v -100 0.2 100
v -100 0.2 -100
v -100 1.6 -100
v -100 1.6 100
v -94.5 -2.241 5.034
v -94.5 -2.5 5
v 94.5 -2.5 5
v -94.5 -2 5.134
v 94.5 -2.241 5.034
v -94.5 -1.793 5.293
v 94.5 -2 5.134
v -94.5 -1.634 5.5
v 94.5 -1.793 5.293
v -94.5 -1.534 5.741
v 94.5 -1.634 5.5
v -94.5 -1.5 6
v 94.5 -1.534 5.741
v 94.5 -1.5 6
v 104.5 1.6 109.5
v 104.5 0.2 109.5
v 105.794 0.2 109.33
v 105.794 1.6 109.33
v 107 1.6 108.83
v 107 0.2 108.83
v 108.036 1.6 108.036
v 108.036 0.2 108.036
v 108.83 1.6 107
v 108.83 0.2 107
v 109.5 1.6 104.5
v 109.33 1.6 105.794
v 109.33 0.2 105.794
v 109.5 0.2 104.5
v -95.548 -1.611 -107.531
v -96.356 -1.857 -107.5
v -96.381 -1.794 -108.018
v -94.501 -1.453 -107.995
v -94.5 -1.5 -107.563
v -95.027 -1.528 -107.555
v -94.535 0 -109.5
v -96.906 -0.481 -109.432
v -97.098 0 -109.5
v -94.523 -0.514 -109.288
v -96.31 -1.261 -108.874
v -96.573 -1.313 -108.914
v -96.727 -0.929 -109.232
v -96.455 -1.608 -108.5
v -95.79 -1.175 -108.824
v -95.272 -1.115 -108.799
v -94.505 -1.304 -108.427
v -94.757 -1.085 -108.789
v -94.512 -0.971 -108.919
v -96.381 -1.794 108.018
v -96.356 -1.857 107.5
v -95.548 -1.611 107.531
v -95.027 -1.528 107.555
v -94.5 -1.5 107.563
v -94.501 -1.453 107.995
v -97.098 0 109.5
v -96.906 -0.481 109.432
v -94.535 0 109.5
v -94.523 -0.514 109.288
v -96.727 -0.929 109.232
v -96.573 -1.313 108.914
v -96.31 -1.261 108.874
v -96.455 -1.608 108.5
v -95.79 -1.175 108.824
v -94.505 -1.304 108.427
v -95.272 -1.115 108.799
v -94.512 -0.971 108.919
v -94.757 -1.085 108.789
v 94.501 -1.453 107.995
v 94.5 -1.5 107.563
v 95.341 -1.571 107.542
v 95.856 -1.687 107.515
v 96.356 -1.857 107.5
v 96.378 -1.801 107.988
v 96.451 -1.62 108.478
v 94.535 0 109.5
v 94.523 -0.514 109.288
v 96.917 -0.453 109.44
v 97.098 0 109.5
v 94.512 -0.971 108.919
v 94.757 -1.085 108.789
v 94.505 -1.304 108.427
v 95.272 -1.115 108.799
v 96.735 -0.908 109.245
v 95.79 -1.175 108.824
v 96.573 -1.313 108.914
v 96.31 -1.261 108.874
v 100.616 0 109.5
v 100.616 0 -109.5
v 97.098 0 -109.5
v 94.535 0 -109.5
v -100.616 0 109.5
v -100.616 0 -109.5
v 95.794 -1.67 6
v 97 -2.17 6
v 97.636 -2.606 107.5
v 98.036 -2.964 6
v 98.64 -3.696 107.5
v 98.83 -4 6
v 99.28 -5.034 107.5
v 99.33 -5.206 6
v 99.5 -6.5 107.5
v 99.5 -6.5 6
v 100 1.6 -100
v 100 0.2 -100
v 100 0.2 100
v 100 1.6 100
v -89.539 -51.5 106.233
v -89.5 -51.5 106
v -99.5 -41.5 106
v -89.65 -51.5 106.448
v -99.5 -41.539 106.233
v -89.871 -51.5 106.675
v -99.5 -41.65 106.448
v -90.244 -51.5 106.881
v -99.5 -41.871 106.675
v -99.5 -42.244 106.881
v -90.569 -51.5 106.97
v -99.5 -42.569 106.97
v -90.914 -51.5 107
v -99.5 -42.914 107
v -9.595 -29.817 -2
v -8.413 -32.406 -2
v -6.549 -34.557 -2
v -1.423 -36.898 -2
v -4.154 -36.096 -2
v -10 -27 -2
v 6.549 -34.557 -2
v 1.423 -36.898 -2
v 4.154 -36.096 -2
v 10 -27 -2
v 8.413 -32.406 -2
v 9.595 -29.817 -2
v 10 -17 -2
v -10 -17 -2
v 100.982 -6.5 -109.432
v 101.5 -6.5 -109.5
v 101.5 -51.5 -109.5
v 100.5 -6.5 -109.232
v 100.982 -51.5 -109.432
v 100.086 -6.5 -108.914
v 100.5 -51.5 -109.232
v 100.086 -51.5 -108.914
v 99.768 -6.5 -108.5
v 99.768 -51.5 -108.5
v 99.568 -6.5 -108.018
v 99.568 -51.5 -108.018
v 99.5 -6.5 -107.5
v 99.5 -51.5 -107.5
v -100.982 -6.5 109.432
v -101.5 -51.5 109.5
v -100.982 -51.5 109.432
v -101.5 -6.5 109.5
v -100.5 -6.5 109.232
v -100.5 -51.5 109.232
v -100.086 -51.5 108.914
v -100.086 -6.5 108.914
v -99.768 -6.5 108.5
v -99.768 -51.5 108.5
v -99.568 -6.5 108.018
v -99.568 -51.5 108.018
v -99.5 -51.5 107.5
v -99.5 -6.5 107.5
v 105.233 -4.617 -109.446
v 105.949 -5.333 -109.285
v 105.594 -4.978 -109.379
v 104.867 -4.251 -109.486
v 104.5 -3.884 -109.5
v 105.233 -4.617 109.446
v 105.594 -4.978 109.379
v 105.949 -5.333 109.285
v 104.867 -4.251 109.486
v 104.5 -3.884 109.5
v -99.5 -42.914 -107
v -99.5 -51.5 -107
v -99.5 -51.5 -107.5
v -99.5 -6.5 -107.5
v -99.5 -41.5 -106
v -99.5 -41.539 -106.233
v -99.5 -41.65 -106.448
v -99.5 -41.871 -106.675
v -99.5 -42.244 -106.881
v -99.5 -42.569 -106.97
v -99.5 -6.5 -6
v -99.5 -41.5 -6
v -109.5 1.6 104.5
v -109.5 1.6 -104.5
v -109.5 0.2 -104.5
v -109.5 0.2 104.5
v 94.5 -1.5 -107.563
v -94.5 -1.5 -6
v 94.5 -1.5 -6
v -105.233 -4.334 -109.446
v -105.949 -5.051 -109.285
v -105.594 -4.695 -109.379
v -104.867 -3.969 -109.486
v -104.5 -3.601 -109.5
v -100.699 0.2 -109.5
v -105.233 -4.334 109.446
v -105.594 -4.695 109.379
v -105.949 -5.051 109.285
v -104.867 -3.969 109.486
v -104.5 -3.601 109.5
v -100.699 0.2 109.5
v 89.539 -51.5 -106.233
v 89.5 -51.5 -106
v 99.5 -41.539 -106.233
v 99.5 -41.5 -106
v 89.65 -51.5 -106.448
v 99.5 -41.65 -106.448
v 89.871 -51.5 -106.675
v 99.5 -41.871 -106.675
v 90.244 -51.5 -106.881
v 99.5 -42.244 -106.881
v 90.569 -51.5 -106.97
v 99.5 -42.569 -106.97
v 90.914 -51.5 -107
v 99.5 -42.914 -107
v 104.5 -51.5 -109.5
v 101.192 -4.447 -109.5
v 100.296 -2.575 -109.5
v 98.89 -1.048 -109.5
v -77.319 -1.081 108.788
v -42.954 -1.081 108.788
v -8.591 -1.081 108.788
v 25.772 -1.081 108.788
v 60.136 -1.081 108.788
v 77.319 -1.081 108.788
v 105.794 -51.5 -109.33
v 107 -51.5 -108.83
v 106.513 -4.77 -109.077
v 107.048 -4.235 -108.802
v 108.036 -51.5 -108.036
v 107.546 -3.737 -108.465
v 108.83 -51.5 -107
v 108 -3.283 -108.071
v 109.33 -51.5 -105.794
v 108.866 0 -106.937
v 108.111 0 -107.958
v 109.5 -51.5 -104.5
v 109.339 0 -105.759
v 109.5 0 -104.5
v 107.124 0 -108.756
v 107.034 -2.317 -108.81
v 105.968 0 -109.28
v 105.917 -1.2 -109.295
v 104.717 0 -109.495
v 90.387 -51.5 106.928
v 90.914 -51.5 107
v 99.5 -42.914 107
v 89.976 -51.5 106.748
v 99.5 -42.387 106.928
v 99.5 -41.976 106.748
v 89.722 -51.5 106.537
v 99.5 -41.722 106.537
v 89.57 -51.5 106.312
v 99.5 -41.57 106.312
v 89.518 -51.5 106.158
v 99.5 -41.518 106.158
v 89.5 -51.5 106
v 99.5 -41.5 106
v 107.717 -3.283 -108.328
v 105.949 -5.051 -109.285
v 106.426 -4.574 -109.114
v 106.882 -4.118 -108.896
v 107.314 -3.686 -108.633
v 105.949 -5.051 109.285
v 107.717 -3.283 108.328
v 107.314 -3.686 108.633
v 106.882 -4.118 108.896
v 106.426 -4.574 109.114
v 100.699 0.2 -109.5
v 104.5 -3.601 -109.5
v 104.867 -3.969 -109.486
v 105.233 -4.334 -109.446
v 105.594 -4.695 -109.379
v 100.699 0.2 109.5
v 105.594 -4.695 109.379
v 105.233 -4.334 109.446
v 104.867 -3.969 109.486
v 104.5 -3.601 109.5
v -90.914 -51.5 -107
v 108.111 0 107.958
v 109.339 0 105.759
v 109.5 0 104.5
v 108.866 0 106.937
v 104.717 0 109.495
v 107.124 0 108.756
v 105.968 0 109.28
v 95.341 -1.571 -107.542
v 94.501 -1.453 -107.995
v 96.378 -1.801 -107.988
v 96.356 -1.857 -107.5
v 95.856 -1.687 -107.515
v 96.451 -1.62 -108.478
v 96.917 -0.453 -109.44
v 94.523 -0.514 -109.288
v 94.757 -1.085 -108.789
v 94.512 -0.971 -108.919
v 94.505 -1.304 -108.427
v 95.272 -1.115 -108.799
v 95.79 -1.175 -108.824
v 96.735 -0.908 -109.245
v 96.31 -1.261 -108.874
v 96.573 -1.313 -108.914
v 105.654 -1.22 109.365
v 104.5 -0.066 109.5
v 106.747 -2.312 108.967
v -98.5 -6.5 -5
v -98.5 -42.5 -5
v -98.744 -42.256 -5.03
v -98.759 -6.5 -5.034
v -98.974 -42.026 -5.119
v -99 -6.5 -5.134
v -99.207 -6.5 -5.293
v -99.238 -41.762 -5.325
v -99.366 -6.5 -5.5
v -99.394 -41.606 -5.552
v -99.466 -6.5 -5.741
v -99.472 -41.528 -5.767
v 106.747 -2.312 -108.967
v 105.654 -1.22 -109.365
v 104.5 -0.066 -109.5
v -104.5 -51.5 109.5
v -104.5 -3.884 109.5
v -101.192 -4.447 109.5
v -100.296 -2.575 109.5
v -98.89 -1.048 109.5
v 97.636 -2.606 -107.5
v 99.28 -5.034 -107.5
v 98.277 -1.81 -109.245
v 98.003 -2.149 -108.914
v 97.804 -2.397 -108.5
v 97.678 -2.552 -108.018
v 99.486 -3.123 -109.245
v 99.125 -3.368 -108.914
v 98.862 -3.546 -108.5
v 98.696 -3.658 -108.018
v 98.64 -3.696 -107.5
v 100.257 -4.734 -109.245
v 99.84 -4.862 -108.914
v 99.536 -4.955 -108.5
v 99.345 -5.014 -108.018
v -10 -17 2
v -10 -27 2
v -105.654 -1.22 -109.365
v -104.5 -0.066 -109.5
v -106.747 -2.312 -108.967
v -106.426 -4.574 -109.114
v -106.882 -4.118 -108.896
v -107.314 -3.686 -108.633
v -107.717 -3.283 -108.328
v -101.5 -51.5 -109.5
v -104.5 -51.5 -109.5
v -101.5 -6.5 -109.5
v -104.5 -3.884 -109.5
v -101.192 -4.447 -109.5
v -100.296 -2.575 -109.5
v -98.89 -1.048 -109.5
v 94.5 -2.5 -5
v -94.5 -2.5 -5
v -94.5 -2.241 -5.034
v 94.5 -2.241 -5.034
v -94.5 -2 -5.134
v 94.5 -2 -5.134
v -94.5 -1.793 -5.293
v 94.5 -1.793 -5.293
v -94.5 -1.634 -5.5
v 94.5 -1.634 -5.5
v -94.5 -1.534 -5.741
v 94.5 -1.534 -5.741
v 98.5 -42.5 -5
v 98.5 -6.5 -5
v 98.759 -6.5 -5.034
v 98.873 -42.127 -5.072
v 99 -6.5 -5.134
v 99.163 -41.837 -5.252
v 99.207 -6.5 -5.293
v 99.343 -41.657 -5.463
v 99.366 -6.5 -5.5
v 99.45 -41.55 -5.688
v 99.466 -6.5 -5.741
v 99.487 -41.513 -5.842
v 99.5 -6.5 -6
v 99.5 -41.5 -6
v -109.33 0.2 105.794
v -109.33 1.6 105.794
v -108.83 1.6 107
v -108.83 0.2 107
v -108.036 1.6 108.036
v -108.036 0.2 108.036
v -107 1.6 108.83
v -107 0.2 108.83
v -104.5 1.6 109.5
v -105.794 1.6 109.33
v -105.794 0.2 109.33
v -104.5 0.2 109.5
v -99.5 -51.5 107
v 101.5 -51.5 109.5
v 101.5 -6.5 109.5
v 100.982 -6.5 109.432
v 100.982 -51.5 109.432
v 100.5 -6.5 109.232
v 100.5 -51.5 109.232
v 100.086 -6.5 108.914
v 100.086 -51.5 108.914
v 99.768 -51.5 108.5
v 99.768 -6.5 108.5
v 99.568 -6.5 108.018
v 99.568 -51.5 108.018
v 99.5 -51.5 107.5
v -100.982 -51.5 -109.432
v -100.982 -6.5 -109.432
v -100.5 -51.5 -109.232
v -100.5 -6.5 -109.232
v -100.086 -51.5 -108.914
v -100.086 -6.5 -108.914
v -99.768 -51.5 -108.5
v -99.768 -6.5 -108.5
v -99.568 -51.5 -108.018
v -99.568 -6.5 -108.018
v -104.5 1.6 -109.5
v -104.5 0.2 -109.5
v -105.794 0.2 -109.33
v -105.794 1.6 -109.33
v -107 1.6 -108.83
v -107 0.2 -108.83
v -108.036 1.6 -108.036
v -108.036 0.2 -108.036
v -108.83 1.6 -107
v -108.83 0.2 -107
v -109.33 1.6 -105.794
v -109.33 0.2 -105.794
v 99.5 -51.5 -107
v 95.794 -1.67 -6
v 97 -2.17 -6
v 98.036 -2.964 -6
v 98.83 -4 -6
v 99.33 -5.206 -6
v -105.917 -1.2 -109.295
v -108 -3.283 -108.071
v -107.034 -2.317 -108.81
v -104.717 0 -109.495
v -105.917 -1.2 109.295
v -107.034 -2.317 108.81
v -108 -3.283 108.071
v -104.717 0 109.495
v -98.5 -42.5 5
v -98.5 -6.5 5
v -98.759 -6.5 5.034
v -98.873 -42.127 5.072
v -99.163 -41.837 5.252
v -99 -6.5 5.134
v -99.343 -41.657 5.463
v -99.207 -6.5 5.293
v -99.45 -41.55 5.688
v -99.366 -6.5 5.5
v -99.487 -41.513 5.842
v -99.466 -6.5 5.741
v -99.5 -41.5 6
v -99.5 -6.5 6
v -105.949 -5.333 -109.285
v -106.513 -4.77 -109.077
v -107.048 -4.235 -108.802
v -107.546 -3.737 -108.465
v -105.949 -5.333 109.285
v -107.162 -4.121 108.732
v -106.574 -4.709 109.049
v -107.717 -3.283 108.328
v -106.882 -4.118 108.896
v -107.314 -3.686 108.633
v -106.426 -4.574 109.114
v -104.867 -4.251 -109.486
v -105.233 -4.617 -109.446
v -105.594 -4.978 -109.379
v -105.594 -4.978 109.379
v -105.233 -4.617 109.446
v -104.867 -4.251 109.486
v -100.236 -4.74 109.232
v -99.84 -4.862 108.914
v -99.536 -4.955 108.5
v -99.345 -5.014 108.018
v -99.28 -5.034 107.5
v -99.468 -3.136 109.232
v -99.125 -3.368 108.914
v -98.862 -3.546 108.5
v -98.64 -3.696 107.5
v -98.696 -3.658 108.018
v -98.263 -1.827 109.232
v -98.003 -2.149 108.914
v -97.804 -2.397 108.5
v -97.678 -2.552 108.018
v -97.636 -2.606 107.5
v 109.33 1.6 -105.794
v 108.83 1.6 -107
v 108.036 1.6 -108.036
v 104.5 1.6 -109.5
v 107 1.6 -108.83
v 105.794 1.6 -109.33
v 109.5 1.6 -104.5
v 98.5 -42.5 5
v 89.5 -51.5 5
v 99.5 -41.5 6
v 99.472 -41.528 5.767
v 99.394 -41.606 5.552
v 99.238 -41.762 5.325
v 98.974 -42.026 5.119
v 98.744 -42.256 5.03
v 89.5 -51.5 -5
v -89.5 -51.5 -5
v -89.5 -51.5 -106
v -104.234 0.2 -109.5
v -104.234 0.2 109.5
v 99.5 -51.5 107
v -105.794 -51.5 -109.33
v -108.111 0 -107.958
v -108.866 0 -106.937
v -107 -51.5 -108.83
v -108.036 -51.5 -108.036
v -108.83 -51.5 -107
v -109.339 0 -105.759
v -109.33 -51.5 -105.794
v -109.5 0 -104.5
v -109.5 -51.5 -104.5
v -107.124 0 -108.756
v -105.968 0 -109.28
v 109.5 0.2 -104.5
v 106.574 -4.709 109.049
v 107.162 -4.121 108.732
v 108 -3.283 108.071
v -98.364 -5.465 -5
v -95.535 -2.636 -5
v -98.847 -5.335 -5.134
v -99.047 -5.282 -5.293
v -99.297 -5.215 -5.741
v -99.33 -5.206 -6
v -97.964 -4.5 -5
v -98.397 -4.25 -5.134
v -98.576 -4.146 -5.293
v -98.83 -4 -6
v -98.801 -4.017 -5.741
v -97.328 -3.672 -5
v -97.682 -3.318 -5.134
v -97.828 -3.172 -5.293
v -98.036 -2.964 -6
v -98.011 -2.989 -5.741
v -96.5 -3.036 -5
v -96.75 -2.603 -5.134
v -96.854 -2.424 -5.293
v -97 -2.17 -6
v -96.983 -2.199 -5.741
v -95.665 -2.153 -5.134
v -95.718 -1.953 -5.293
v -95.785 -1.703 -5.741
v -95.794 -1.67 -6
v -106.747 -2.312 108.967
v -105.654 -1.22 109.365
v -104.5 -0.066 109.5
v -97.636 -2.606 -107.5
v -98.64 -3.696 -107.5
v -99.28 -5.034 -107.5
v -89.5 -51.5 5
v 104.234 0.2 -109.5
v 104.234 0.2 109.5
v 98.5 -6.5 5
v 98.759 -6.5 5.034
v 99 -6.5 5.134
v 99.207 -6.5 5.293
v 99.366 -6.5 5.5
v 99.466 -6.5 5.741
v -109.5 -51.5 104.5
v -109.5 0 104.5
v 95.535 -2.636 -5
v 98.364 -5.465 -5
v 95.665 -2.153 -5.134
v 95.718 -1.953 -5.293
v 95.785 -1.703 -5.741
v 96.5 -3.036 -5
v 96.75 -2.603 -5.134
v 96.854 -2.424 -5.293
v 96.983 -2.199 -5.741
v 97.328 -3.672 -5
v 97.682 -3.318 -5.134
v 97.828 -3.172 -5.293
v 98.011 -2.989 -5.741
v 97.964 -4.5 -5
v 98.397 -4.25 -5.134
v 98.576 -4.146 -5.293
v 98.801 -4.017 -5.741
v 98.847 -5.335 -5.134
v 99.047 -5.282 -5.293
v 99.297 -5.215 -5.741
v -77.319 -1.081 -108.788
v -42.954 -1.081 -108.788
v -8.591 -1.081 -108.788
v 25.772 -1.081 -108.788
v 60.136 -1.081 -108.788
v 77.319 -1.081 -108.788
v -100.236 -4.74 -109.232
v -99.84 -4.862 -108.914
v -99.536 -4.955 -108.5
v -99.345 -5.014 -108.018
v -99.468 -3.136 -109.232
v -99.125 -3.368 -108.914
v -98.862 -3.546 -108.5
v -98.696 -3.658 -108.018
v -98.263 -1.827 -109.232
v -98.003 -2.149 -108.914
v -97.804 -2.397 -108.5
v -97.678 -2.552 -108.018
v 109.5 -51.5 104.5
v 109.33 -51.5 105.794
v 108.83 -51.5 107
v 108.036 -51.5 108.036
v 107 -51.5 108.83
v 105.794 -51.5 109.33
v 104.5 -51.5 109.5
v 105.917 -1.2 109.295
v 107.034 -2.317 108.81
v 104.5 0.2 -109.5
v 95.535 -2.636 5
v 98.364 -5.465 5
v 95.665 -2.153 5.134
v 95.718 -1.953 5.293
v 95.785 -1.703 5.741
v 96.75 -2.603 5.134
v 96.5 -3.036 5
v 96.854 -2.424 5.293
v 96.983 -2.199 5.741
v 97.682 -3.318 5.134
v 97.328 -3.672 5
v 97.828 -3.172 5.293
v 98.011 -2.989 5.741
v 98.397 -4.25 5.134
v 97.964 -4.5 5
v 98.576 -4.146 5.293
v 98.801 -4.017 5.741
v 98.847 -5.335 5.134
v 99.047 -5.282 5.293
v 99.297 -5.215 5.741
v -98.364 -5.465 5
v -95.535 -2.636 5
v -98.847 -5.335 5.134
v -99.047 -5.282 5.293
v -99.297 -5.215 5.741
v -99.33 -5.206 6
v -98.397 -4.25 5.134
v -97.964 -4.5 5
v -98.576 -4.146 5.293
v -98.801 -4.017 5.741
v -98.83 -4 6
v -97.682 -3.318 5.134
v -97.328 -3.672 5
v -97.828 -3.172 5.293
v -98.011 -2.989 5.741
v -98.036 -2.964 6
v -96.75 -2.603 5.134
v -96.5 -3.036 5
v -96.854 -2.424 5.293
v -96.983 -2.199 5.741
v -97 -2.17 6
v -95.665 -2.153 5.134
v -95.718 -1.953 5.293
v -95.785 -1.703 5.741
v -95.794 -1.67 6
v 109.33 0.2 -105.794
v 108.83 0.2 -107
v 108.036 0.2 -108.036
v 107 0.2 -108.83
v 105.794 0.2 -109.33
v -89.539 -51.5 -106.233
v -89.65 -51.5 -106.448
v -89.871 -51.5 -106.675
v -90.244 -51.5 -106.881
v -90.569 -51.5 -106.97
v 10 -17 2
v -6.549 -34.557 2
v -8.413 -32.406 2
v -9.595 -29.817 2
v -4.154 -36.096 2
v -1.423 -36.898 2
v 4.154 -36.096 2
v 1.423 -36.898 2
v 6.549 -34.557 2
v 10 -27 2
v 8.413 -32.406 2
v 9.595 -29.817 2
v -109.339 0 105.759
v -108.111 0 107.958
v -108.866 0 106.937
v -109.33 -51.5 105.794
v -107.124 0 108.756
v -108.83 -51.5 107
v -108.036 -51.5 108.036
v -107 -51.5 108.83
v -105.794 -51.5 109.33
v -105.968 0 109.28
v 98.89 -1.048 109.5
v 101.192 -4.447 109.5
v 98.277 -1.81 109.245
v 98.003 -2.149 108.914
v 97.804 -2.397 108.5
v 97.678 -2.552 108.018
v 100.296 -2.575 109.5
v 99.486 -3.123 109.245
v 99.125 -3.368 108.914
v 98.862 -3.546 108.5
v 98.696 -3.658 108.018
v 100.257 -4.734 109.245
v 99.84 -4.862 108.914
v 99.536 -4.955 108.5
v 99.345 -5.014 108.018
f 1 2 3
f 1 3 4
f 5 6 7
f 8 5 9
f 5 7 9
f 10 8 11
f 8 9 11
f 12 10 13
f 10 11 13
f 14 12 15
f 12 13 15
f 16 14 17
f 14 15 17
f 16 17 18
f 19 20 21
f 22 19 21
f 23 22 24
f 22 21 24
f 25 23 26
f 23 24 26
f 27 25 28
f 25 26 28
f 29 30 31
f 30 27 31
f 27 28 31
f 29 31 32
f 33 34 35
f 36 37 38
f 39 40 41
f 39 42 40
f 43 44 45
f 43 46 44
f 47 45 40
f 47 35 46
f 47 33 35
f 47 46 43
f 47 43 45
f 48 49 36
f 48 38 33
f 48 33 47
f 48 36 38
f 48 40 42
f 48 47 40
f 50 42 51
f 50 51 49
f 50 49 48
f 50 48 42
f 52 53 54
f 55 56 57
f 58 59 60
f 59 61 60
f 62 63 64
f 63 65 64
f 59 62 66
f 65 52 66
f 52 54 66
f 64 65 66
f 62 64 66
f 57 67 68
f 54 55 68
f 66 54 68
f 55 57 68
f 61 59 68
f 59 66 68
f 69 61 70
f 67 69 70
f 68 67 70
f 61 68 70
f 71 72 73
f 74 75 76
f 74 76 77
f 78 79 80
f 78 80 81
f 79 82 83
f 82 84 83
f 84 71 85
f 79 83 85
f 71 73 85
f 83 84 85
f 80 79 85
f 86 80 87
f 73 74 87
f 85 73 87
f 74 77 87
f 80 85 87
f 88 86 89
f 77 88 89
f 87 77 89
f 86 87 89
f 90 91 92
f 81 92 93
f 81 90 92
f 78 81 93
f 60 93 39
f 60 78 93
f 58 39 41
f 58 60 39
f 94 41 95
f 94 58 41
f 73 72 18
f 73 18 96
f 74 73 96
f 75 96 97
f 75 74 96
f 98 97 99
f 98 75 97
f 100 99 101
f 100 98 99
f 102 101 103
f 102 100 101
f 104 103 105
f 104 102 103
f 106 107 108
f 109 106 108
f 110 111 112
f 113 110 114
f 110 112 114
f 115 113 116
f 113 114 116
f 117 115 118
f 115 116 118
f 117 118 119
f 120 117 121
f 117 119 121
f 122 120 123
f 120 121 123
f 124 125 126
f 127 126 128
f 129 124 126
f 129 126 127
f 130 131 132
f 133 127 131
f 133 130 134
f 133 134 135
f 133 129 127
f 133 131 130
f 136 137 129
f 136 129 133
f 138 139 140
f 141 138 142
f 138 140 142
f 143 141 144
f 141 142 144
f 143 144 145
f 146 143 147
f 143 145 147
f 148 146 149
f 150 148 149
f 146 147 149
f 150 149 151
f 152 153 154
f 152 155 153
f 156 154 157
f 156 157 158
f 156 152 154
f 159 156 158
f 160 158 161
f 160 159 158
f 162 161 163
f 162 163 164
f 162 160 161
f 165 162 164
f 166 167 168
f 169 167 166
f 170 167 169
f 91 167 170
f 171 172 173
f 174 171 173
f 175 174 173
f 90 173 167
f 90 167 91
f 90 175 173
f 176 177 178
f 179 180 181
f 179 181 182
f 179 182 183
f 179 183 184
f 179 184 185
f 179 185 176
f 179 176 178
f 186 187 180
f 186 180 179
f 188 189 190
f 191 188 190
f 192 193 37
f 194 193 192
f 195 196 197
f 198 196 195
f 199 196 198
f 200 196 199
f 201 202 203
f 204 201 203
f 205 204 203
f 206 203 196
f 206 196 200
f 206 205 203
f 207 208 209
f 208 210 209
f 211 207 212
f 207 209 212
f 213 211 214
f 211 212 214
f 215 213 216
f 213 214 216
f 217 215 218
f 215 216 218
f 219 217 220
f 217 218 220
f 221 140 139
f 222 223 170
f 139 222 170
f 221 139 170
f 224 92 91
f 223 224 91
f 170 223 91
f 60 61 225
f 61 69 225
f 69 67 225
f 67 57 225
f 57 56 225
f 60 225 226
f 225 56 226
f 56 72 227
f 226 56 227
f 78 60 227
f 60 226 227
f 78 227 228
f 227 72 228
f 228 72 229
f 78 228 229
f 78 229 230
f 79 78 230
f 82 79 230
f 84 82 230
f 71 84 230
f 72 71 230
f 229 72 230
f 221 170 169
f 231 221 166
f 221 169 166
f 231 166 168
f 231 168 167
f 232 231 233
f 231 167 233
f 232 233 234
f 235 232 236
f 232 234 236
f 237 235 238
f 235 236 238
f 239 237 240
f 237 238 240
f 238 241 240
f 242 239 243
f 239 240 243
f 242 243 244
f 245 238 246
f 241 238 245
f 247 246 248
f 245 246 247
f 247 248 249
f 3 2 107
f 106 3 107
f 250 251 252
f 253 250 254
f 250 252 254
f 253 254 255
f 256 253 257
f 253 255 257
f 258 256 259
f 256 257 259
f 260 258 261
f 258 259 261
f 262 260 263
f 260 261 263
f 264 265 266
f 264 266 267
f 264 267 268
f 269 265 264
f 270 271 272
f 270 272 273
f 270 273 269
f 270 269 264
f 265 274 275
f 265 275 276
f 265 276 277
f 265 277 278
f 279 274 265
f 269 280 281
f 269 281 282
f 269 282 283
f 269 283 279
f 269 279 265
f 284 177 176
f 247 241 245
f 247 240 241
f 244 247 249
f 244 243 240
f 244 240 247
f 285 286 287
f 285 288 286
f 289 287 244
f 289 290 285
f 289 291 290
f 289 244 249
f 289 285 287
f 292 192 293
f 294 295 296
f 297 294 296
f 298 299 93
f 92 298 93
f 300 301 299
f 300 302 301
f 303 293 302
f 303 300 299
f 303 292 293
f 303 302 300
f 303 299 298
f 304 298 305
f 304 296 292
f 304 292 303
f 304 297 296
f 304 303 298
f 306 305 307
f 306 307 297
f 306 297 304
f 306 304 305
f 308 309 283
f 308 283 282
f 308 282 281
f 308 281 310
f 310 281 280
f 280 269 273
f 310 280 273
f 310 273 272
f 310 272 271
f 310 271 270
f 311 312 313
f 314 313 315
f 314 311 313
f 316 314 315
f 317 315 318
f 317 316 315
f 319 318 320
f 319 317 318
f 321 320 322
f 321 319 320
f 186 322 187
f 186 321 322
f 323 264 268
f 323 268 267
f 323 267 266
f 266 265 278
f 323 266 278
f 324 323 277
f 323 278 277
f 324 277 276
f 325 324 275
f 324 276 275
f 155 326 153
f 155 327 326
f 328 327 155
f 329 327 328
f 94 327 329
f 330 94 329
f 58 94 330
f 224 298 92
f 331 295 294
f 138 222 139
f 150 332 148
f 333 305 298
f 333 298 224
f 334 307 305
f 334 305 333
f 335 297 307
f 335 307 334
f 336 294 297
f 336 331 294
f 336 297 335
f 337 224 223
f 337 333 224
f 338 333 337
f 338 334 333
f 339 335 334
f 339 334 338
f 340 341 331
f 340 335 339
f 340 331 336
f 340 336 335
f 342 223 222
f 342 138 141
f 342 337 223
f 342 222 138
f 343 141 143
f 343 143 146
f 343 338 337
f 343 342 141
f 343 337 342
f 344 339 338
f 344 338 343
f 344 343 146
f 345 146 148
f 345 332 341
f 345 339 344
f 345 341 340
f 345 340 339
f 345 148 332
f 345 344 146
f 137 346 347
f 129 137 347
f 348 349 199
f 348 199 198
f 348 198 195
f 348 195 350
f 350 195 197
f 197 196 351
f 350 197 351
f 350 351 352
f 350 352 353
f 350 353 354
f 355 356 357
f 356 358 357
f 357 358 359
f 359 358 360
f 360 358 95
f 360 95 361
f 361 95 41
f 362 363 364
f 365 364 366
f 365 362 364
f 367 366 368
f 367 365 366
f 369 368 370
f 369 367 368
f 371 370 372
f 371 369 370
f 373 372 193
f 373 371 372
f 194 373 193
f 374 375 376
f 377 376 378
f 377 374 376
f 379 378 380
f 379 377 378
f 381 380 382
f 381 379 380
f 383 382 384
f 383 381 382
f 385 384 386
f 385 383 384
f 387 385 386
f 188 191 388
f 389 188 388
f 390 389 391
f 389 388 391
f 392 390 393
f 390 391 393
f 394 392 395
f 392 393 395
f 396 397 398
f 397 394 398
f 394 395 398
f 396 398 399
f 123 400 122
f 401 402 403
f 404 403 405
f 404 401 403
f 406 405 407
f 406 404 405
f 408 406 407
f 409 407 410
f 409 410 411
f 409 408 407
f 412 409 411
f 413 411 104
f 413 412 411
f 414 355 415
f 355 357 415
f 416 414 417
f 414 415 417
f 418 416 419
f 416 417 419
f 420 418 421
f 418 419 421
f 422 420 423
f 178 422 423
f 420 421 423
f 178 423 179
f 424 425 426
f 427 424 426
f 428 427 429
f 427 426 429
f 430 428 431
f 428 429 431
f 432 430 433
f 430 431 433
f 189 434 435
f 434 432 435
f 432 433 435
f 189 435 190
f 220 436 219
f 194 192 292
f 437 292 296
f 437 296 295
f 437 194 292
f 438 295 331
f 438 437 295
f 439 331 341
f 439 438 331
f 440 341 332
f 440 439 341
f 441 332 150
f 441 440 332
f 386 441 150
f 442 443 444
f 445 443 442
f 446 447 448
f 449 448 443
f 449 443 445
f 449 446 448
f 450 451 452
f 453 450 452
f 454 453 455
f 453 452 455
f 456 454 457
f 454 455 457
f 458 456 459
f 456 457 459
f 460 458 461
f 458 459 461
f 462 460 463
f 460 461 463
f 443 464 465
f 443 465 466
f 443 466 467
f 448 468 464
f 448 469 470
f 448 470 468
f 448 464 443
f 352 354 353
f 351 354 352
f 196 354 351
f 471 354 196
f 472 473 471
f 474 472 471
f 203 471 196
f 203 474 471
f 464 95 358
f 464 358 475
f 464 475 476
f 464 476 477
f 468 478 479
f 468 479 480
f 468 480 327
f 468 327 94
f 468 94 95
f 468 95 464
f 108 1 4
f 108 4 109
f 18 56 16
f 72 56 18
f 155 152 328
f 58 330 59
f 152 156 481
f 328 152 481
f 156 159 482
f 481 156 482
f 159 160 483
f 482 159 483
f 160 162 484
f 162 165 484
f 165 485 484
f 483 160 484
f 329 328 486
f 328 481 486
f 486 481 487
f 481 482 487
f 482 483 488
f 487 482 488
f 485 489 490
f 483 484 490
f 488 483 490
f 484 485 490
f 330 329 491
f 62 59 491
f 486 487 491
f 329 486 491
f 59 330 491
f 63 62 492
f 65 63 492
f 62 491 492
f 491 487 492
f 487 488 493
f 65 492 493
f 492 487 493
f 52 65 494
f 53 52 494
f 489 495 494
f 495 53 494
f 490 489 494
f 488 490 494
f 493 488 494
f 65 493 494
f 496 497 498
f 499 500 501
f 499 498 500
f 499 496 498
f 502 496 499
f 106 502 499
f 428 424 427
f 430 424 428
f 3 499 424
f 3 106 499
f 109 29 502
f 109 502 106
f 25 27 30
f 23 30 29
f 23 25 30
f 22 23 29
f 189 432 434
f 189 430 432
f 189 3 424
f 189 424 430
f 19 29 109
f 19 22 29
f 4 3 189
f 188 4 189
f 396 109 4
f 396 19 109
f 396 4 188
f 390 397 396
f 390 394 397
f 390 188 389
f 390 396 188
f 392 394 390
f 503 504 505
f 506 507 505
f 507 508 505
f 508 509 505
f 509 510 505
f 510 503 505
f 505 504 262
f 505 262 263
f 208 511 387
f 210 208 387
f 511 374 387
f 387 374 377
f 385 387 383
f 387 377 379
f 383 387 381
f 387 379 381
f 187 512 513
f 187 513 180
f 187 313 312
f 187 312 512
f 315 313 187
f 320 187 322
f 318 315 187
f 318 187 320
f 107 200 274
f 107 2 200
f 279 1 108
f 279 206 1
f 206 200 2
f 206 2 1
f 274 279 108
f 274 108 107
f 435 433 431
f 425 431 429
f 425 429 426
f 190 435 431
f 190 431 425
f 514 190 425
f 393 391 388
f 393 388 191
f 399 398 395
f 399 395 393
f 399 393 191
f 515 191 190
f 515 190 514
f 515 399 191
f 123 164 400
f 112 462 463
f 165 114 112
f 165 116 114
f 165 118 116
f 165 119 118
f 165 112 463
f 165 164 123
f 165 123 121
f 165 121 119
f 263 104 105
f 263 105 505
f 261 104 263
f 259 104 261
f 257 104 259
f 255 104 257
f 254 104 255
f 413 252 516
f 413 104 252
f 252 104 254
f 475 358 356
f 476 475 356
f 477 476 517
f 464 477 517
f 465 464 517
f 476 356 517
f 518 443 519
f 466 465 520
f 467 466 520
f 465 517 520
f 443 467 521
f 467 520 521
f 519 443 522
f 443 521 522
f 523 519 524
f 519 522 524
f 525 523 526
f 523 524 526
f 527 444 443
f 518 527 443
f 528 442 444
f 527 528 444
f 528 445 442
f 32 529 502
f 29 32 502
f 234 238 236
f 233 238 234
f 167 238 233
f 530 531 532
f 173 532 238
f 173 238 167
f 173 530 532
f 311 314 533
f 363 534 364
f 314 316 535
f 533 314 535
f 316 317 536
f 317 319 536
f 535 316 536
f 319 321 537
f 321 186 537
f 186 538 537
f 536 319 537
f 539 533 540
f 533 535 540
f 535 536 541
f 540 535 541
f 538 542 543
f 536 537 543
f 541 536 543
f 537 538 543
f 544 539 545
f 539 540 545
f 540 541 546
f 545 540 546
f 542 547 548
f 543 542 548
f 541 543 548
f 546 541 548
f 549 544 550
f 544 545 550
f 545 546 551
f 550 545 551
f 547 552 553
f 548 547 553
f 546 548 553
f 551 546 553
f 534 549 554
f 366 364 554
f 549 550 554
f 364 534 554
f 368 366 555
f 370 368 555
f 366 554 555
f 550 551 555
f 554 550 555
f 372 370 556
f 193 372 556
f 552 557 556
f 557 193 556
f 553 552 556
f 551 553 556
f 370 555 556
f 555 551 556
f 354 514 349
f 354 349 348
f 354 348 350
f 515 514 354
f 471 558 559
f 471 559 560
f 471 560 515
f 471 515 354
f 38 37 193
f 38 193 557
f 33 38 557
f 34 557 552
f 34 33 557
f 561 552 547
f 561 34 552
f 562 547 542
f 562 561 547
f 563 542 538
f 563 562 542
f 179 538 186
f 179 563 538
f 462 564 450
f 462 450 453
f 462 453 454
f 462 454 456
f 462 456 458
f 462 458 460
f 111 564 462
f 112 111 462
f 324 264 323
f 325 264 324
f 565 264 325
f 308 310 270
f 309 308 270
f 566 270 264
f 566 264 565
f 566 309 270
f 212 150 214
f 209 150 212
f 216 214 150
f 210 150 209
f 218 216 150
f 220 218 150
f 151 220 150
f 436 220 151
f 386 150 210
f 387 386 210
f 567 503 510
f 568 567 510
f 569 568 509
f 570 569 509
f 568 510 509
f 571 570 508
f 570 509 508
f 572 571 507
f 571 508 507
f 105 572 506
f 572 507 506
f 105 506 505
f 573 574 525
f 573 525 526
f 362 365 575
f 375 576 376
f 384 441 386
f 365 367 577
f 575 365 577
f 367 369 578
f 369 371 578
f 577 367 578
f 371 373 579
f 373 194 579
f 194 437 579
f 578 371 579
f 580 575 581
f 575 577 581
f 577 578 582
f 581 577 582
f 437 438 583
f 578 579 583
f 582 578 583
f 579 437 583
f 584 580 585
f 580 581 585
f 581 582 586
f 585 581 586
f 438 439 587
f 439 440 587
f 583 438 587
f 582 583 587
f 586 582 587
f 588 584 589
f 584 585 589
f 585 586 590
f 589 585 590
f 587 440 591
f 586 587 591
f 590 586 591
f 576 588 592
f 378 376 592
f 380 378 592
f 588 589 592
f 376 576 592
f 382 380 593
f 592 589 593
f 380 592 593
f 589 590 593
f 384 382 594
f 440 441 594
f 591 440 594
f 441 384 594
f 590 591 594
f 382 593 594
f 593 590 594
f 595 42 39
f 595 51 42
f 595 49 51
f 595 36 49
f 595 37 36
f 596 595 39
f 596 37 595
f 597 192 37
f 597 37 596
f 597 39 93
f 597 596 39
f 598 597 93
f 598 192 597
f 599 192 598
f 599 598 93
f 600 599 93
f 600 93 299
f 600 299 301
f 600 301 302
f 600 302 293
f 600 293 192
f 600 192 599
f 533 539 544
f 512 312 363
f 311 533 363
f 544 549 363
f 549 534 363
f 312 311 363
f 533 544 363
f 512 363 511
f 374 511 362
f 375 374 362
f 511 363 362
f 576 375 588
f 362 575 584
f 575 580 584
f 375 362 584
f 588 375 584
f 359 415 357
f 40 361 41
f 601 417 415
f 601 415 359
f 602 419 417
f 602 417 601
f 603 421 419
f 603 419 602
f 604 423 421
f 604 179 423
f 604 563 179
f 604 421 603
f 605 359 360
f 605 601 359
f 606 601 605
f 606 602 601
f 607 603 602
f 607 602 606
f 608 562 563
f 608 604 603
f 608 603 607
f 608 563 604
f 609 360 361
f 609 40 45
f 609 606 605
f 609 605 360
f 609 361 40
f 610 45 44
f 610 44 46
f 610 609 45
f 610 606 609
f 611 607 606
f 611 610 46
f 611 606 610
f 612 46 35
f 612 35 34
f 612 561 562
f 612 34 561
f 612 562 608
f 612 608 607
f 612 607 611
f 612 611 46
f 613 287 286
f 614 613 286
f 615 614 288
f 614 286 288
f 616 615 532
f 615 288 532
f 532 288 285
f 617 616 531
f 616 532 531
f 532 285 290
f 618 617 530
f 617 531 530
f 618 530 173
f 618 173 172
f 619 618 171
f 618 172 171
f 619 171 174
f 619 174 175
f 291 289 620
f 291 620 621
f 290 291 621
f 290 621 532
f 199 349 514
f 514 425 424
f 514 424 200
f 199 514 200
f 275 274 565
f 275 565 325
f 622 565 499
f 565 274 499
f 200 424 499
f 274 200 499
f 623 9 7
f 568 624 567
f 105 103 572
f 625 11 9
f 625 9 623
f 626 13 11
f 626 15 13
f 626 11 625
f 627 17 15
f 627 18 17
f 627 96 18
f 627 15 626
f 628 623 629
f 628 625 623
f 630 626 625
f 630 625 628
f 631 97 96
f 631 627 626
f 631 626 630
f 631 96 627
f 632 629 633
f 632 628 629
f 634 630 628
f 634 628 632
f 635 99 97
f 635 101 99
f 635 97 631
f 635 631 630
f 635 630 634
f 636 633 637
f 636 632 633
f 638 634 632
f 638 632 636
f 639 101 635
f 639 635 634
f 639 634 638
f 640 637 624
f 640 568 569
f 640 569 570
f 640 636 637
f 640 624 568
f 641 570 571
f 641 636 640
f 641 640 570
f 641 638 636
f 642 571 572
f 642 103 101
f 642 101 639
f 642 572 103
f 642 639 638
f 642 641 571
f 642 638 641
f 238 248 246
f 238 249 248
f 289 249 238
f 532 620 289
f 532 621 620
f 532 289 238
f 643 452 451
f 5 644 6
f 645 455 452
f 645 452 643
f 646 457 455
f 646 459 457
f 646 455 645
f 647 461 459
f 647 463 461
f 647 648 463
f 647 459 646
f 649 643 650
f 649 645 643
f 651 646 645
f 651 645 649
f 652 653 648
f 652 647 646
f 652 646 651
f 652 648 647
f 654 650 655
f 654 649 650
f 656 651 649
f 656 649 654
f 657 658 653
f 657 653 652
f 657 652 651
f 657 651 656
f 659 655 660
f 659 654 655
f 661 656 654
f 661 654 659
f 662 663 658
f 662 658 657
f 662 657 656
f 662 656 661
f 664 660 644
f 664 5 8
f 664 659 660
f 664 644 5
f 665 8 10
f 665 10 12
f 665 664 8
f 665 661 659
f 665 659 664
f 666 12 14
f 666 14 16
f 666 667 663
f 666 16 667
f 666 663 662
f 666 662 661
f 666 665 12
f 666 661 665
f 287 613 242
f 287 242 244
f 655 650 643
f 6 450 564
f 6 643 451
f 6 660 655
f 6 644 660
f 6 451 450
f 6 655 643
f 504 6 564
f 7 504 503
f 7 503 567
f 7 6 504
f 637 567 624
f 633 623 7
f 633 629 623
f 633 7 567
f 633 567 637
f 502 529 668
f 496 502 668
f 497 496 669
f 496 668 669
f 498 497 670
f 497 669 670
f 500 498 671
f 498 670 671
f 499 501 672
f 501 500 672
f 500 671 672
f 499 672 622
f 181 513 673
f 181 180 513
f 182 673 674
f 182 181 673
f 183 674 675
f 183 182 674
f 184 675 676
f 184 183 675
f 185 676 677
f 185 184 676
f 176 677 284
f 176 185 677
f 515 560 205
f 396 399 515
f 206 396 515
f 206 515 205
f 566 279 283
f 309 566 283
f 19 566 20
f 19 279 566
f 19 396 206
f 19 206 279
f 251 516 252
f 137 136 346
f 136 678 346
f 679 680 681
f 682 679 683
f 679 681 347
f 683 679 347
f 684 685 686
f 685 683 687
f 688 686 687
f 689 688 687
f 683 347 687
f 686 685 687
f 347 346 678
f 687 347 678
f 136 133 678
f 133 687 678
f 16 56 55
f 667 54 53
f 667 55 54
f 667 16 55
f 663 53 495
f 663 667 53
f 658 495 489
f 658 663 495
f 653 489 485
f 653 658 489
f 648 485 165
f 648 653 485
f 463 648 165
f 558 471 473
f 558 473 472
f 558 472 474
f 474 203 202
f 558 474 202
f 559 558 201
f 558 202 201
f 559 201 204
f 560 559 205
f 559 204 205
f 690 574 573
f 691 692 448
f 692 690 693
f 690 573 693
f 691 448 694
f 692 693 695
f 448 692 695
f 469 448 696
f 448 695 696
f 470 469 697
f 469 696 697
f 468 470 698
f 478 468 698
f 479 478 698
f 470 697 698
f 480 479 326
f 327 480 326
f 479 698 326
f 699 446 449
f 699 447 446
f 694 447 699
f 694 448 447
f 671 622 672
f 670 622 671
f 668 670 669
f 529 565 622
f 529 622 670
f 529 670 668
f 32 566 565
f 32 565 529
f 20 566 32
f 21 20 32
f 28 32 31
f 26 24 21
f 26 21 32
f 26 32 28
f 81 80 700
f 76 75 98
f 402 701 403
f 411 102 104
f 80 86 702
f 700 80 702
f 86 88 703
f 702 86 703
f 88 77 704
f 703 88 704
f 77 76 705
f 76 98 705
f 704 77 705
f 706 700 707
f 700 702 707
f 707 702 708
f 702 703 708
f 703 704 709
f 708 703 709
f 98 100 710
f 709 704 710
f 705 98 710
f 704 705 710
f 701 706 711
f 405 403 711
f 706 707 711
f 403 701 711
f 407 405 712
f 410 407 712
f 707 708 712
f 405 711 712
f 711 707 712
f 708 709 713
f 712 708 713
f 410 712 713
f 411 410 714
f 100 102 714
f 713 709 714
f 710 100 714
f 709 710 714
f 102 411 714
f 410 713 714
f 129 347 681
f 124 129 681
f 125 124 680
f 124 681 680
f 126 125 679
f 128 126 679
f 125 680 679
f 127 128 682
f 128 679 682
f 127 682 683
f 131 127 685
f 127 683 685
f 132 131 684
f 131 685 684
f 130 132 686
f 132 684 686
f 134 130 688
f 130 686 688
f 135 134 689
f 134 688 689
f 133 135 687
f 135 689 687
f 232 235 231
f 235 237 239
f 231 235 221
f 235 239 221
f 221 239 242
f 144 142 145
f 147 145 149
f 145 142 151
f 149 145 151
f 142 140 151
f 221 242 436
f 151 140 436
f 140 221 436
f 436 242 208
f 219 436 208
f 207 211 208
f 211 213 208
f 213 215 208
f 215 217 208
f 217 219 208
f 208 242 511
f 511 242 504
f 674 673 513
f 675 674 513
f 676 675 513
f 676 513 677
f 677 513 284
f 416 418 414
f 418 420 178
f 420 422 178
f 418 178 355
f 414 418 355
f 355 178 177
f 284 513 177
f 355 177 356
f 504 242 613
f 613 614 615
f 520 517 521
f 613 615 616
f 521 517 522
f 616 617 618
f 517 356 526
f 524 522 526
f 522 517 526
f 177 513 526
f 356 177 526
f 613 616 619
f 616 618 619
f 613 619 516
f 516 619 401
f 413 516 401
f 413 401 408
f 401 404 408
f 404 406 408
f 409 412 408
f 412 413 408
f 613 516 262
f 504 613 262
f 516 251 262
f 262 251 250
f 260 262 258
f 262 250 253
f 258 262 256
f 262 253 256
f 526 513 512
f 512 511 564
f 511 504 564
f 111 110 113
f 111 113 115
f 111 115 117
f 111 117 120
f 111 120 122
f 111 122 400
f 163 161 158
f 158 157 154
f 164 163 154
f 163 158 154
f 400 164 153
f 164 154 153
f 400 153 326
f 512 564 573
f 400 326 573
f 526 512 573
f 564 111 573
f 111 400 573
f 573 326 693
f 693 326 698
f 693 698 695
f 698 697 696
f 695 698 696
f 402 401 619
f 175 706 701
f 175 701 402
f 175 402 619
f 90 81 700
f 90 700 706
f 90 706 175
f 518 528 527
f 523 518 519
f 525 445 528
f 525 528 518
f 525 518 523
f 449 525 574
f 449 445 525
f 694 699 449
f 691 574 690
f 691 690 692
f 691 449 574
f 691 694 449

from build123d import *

# Parameters (mm, degrees)
BOSS_EXTRUDE1_DEPTH  = 109.5
BOSS_EXTRUDE2_DEPTH  = 109.5
SKETCH2_W            = 200
SKETCH2_H            = 200
CUT_EXTRUDE1_DEPTH   = 164.258659801
FILLET1_R            = 5
SKETCH3_W            = 199
SKETCH3_H            = 50
BOSS_EXTRUDE3_DEPTH  = 5
FILLET2_R            = 5
SKETCH9_W            = 379
SKETCH9_H            = 379
CUT_EXTRUDE3_DEPTH   = 164.707391403
FILLET4_R            = 2
FILLET5_R            = 1
BOSS_EXTRUDE6_DEPTH  = 107
FILLET6_R            = 1
FILLET6_OF_MIRROR1_R = 1
CUT_EXTRUDE4_DEPTH   = 2


with BuildPart() as part:
    # Sketch1 → Boss-Extrude1 (new, symmetric)
    with BuildSketch(Plane.XY):
        Polygon((-99.5, -1.5), (99.5, -1.5), (99.5, -51.5), (109.5, -51.5), (109.5, 0), (104.717157288, 0), (108, -3.282842712), (105.949390335, -5.333452378), (100.615937957, 0), (-100.615937957, 0), (-105.949390335, -5.333452378), (-108, -3.282842712), (-104.717157288, 0), (-109.5, 0), (-109.5, -51.5), (-99.5, -51.5), align=None)
    extrude(amount=BOSS_EXTRUDE1_DEPTH, both=True)

    # Fillet1
    fillet1_edges = [part.edges().sort_by_distance(p)[0] for p in [
        (99.5, -1.5, 0),
        (-99.5, -1.5, 0),
    ]]
    fillet(fillet1_edges, radius=FILLET1_R)

    # Sketch3 → Boss-Extrude3 (add, symmetric)
    with BuildSketch(Plane.XY):
        with Locations((0, -26.5)):
            Rectangle(SKETCH3_W, SKETCH3_H)
    extrude(amount=BOSS_EXTRUDE3_DEPTH, both=True)

    # Fillet2
    fillet2_edges = [part.edges().sort_by_distance(p)[0] for p in [
        (-109.5, -25.75, 109.5),
        (-109.5, -25.75, -109.5),
        (109.5, -25.75, -109.5),
        (109.5, -25.75, 109.5),
    ]]
    fillet(fillet2_edges, radius=FILLET2_R)

    # Fillet4
    fillet4_edges = [part.edges().sort_by_distance(p)[0] for p in [
        (-99.5, -29, 109.5),
        (-98.035533906, -2.964466094, 109.5),
        (99.5, -29, 109.5),
        (98.035533906, -2.964466094, 109.5),
        (-99.5, -29, -109.5),
        (-98.035533906, -2.964466094, -109.5),
        (99.5, -29, -109.5),
        (98.035533906, -2.964466094, -109.5),
        (0, -1.5, 109.5),
        (0, -1.5, -109.5),
    ]]
    fillet(fillet4_edges, radius=FILLET4_R)

    # Fillet5
    fillet5_edges = [part.edges().sort_by_distance(p)[0] for p in [
        (-99.5, -29, -5),
        (-98.035533906, -2.964466094, -5),
        (0, -1.5, -5),
        (98.035533906, -2.964466094, -5),
        (-99.5, -29, 5),
        (-98.035533906, -2.964466094, 5),
        (0, -1.5, 5),
        (98.035533906, -2.964466094, 5),
        (99.5, -29, -5),
        (99.5, -29, 5),
    ]]
    fillet(fillet5_edges, radius=FILLET5_R)

    # Sketch6 → Boss-Extrude6 (add, symmetric)
    with BuildSketch(Plane.XY):
        Polygon((-99.5, -51.5), (-89.5, -51.5), (-99.5, -41.5), align=None)
    boss_extrude6 = extrude(amount=BOSS_EXTRUDE6_DEPTH, both=True)

    # Fillet6
    fillet6_edges = [part.edges().sort_by_distance(p)[0] for p in [
        (-94.5, -46.5, 107),
        (-94.5, -46.5, -107),
    ]]
    fillet(fillet6_edges, radius=FILLET6_R)

    # Mirror1: Boss-Extrude6 across plane
    add(boss_extrude6.mirror(Plane(origin=(0, 0, 0), x_dir=(0, 0, 1), z_dir=(1, 0, 0))))

    # Fillet6 of Mirror1
    fillet6_of_mirror1_edges = [part.edges().sort_by_distance(p)[0] for p in [
        (94.5, -46.5, 107),
        (94.5, -46.5, -107),
    ]]
    fillet(fillet6_of_mirror1_edges, radius=FILLET6_OF_MIRROR1_R)

    # Sketch10 → Cut-Extrude4 (cut, symmetric)
    with BuildSketch(Plane.XY):
        with BuildLine():
            Line((10, -17), (-10, -17))
            Line((-10, -17), (-10, -27))
            ThreePointArc((-10, -27), (0, -37), (10, -27))
            Line((10, -27), (10, -17))
        make_face()
    extrude(amount=CUT_EXTRUDE4_DEPTH, both=True, mode=Mode.SUBTRACT)


with BuildPart() as body_2:
    # Sketch1<4> → Boss-Extrude2 (new, symmetric)
    with BuildSketch(Plane.XY):
        Polygon((-109.5, 0.2), (-104.234314575, 0.2), (-107.717157288, -3.282842712), (-105.949390335, -5.050609665), (-100.698780669, 0.2), (100.698780669, 0.2), (105.949390335, -5.050609665), (107.717157288, -3.282842712), (104.234314575, 0.2), (109.5, 0.2), (109.5, 1.6), (-109.5, 1.6), align=None)
    extrude(amount=BOSS_EXTRUDE2_DEPTH, both=True)

    # Sketch2 → Cut-Extrude1 (cut, through all)
    with BuildSketch(Plane.XZ.offset(-0.2)):
        Rectangle(SKETCH2_W, SKETCH2_H)
    extrude(amount=-CUT_EXTRUDE1_DEPTH, mode=Mode.SUBTRACT)

    # Sketch9 → Cut-Extrude3 (cut, through all)
    with BuildSketch(Plane.XZ.offset(51.5)):
        Rectangle(SKETCH9_W, SKETCH9_H)
        with BuildLine():
            ThreePointArc((109.5, -104.5), (108.035533906, -108.035533906), (104.5, -109.5))
            Line((104.5, -109.5), (99.5, -109.5))
            Line((99.5, -109.5), (-99.5, -109.5))
            Line((-99.5, -109.5), (-104.5, -109.5))
            ThreePointArc((-104.5, -109.5), (-108.035533906, -108.035533906), (-109.5, -104.5))
            Line((-109.5, -104.5), (-109.5, 104.5))
            ThreePointArc((-109.5, 104.5), (-108.035533906, 108.035533906), (-104.5, 109.5))
            Line((-104.5, 109.5), (-99.5, 109.5))
            Line((-99.5, 109.5), (99.5, 109.5))
            Line((99.5, 109.5), (104.5, 109.5))
            ThreePointArc((104.5, 109.5), (108.035533906, 108.035533906), (109.5, 104.5))
            Line((109.5, 104.5), (109.5, -104.5))
        make_face(mode=Mode.SUBTRACT)
    extrude(amount=-CUT_EXTRUDE3_DEPTH, mode=Mode.SUBTRACT)


solid = Compound([part.part, body_2.part])
